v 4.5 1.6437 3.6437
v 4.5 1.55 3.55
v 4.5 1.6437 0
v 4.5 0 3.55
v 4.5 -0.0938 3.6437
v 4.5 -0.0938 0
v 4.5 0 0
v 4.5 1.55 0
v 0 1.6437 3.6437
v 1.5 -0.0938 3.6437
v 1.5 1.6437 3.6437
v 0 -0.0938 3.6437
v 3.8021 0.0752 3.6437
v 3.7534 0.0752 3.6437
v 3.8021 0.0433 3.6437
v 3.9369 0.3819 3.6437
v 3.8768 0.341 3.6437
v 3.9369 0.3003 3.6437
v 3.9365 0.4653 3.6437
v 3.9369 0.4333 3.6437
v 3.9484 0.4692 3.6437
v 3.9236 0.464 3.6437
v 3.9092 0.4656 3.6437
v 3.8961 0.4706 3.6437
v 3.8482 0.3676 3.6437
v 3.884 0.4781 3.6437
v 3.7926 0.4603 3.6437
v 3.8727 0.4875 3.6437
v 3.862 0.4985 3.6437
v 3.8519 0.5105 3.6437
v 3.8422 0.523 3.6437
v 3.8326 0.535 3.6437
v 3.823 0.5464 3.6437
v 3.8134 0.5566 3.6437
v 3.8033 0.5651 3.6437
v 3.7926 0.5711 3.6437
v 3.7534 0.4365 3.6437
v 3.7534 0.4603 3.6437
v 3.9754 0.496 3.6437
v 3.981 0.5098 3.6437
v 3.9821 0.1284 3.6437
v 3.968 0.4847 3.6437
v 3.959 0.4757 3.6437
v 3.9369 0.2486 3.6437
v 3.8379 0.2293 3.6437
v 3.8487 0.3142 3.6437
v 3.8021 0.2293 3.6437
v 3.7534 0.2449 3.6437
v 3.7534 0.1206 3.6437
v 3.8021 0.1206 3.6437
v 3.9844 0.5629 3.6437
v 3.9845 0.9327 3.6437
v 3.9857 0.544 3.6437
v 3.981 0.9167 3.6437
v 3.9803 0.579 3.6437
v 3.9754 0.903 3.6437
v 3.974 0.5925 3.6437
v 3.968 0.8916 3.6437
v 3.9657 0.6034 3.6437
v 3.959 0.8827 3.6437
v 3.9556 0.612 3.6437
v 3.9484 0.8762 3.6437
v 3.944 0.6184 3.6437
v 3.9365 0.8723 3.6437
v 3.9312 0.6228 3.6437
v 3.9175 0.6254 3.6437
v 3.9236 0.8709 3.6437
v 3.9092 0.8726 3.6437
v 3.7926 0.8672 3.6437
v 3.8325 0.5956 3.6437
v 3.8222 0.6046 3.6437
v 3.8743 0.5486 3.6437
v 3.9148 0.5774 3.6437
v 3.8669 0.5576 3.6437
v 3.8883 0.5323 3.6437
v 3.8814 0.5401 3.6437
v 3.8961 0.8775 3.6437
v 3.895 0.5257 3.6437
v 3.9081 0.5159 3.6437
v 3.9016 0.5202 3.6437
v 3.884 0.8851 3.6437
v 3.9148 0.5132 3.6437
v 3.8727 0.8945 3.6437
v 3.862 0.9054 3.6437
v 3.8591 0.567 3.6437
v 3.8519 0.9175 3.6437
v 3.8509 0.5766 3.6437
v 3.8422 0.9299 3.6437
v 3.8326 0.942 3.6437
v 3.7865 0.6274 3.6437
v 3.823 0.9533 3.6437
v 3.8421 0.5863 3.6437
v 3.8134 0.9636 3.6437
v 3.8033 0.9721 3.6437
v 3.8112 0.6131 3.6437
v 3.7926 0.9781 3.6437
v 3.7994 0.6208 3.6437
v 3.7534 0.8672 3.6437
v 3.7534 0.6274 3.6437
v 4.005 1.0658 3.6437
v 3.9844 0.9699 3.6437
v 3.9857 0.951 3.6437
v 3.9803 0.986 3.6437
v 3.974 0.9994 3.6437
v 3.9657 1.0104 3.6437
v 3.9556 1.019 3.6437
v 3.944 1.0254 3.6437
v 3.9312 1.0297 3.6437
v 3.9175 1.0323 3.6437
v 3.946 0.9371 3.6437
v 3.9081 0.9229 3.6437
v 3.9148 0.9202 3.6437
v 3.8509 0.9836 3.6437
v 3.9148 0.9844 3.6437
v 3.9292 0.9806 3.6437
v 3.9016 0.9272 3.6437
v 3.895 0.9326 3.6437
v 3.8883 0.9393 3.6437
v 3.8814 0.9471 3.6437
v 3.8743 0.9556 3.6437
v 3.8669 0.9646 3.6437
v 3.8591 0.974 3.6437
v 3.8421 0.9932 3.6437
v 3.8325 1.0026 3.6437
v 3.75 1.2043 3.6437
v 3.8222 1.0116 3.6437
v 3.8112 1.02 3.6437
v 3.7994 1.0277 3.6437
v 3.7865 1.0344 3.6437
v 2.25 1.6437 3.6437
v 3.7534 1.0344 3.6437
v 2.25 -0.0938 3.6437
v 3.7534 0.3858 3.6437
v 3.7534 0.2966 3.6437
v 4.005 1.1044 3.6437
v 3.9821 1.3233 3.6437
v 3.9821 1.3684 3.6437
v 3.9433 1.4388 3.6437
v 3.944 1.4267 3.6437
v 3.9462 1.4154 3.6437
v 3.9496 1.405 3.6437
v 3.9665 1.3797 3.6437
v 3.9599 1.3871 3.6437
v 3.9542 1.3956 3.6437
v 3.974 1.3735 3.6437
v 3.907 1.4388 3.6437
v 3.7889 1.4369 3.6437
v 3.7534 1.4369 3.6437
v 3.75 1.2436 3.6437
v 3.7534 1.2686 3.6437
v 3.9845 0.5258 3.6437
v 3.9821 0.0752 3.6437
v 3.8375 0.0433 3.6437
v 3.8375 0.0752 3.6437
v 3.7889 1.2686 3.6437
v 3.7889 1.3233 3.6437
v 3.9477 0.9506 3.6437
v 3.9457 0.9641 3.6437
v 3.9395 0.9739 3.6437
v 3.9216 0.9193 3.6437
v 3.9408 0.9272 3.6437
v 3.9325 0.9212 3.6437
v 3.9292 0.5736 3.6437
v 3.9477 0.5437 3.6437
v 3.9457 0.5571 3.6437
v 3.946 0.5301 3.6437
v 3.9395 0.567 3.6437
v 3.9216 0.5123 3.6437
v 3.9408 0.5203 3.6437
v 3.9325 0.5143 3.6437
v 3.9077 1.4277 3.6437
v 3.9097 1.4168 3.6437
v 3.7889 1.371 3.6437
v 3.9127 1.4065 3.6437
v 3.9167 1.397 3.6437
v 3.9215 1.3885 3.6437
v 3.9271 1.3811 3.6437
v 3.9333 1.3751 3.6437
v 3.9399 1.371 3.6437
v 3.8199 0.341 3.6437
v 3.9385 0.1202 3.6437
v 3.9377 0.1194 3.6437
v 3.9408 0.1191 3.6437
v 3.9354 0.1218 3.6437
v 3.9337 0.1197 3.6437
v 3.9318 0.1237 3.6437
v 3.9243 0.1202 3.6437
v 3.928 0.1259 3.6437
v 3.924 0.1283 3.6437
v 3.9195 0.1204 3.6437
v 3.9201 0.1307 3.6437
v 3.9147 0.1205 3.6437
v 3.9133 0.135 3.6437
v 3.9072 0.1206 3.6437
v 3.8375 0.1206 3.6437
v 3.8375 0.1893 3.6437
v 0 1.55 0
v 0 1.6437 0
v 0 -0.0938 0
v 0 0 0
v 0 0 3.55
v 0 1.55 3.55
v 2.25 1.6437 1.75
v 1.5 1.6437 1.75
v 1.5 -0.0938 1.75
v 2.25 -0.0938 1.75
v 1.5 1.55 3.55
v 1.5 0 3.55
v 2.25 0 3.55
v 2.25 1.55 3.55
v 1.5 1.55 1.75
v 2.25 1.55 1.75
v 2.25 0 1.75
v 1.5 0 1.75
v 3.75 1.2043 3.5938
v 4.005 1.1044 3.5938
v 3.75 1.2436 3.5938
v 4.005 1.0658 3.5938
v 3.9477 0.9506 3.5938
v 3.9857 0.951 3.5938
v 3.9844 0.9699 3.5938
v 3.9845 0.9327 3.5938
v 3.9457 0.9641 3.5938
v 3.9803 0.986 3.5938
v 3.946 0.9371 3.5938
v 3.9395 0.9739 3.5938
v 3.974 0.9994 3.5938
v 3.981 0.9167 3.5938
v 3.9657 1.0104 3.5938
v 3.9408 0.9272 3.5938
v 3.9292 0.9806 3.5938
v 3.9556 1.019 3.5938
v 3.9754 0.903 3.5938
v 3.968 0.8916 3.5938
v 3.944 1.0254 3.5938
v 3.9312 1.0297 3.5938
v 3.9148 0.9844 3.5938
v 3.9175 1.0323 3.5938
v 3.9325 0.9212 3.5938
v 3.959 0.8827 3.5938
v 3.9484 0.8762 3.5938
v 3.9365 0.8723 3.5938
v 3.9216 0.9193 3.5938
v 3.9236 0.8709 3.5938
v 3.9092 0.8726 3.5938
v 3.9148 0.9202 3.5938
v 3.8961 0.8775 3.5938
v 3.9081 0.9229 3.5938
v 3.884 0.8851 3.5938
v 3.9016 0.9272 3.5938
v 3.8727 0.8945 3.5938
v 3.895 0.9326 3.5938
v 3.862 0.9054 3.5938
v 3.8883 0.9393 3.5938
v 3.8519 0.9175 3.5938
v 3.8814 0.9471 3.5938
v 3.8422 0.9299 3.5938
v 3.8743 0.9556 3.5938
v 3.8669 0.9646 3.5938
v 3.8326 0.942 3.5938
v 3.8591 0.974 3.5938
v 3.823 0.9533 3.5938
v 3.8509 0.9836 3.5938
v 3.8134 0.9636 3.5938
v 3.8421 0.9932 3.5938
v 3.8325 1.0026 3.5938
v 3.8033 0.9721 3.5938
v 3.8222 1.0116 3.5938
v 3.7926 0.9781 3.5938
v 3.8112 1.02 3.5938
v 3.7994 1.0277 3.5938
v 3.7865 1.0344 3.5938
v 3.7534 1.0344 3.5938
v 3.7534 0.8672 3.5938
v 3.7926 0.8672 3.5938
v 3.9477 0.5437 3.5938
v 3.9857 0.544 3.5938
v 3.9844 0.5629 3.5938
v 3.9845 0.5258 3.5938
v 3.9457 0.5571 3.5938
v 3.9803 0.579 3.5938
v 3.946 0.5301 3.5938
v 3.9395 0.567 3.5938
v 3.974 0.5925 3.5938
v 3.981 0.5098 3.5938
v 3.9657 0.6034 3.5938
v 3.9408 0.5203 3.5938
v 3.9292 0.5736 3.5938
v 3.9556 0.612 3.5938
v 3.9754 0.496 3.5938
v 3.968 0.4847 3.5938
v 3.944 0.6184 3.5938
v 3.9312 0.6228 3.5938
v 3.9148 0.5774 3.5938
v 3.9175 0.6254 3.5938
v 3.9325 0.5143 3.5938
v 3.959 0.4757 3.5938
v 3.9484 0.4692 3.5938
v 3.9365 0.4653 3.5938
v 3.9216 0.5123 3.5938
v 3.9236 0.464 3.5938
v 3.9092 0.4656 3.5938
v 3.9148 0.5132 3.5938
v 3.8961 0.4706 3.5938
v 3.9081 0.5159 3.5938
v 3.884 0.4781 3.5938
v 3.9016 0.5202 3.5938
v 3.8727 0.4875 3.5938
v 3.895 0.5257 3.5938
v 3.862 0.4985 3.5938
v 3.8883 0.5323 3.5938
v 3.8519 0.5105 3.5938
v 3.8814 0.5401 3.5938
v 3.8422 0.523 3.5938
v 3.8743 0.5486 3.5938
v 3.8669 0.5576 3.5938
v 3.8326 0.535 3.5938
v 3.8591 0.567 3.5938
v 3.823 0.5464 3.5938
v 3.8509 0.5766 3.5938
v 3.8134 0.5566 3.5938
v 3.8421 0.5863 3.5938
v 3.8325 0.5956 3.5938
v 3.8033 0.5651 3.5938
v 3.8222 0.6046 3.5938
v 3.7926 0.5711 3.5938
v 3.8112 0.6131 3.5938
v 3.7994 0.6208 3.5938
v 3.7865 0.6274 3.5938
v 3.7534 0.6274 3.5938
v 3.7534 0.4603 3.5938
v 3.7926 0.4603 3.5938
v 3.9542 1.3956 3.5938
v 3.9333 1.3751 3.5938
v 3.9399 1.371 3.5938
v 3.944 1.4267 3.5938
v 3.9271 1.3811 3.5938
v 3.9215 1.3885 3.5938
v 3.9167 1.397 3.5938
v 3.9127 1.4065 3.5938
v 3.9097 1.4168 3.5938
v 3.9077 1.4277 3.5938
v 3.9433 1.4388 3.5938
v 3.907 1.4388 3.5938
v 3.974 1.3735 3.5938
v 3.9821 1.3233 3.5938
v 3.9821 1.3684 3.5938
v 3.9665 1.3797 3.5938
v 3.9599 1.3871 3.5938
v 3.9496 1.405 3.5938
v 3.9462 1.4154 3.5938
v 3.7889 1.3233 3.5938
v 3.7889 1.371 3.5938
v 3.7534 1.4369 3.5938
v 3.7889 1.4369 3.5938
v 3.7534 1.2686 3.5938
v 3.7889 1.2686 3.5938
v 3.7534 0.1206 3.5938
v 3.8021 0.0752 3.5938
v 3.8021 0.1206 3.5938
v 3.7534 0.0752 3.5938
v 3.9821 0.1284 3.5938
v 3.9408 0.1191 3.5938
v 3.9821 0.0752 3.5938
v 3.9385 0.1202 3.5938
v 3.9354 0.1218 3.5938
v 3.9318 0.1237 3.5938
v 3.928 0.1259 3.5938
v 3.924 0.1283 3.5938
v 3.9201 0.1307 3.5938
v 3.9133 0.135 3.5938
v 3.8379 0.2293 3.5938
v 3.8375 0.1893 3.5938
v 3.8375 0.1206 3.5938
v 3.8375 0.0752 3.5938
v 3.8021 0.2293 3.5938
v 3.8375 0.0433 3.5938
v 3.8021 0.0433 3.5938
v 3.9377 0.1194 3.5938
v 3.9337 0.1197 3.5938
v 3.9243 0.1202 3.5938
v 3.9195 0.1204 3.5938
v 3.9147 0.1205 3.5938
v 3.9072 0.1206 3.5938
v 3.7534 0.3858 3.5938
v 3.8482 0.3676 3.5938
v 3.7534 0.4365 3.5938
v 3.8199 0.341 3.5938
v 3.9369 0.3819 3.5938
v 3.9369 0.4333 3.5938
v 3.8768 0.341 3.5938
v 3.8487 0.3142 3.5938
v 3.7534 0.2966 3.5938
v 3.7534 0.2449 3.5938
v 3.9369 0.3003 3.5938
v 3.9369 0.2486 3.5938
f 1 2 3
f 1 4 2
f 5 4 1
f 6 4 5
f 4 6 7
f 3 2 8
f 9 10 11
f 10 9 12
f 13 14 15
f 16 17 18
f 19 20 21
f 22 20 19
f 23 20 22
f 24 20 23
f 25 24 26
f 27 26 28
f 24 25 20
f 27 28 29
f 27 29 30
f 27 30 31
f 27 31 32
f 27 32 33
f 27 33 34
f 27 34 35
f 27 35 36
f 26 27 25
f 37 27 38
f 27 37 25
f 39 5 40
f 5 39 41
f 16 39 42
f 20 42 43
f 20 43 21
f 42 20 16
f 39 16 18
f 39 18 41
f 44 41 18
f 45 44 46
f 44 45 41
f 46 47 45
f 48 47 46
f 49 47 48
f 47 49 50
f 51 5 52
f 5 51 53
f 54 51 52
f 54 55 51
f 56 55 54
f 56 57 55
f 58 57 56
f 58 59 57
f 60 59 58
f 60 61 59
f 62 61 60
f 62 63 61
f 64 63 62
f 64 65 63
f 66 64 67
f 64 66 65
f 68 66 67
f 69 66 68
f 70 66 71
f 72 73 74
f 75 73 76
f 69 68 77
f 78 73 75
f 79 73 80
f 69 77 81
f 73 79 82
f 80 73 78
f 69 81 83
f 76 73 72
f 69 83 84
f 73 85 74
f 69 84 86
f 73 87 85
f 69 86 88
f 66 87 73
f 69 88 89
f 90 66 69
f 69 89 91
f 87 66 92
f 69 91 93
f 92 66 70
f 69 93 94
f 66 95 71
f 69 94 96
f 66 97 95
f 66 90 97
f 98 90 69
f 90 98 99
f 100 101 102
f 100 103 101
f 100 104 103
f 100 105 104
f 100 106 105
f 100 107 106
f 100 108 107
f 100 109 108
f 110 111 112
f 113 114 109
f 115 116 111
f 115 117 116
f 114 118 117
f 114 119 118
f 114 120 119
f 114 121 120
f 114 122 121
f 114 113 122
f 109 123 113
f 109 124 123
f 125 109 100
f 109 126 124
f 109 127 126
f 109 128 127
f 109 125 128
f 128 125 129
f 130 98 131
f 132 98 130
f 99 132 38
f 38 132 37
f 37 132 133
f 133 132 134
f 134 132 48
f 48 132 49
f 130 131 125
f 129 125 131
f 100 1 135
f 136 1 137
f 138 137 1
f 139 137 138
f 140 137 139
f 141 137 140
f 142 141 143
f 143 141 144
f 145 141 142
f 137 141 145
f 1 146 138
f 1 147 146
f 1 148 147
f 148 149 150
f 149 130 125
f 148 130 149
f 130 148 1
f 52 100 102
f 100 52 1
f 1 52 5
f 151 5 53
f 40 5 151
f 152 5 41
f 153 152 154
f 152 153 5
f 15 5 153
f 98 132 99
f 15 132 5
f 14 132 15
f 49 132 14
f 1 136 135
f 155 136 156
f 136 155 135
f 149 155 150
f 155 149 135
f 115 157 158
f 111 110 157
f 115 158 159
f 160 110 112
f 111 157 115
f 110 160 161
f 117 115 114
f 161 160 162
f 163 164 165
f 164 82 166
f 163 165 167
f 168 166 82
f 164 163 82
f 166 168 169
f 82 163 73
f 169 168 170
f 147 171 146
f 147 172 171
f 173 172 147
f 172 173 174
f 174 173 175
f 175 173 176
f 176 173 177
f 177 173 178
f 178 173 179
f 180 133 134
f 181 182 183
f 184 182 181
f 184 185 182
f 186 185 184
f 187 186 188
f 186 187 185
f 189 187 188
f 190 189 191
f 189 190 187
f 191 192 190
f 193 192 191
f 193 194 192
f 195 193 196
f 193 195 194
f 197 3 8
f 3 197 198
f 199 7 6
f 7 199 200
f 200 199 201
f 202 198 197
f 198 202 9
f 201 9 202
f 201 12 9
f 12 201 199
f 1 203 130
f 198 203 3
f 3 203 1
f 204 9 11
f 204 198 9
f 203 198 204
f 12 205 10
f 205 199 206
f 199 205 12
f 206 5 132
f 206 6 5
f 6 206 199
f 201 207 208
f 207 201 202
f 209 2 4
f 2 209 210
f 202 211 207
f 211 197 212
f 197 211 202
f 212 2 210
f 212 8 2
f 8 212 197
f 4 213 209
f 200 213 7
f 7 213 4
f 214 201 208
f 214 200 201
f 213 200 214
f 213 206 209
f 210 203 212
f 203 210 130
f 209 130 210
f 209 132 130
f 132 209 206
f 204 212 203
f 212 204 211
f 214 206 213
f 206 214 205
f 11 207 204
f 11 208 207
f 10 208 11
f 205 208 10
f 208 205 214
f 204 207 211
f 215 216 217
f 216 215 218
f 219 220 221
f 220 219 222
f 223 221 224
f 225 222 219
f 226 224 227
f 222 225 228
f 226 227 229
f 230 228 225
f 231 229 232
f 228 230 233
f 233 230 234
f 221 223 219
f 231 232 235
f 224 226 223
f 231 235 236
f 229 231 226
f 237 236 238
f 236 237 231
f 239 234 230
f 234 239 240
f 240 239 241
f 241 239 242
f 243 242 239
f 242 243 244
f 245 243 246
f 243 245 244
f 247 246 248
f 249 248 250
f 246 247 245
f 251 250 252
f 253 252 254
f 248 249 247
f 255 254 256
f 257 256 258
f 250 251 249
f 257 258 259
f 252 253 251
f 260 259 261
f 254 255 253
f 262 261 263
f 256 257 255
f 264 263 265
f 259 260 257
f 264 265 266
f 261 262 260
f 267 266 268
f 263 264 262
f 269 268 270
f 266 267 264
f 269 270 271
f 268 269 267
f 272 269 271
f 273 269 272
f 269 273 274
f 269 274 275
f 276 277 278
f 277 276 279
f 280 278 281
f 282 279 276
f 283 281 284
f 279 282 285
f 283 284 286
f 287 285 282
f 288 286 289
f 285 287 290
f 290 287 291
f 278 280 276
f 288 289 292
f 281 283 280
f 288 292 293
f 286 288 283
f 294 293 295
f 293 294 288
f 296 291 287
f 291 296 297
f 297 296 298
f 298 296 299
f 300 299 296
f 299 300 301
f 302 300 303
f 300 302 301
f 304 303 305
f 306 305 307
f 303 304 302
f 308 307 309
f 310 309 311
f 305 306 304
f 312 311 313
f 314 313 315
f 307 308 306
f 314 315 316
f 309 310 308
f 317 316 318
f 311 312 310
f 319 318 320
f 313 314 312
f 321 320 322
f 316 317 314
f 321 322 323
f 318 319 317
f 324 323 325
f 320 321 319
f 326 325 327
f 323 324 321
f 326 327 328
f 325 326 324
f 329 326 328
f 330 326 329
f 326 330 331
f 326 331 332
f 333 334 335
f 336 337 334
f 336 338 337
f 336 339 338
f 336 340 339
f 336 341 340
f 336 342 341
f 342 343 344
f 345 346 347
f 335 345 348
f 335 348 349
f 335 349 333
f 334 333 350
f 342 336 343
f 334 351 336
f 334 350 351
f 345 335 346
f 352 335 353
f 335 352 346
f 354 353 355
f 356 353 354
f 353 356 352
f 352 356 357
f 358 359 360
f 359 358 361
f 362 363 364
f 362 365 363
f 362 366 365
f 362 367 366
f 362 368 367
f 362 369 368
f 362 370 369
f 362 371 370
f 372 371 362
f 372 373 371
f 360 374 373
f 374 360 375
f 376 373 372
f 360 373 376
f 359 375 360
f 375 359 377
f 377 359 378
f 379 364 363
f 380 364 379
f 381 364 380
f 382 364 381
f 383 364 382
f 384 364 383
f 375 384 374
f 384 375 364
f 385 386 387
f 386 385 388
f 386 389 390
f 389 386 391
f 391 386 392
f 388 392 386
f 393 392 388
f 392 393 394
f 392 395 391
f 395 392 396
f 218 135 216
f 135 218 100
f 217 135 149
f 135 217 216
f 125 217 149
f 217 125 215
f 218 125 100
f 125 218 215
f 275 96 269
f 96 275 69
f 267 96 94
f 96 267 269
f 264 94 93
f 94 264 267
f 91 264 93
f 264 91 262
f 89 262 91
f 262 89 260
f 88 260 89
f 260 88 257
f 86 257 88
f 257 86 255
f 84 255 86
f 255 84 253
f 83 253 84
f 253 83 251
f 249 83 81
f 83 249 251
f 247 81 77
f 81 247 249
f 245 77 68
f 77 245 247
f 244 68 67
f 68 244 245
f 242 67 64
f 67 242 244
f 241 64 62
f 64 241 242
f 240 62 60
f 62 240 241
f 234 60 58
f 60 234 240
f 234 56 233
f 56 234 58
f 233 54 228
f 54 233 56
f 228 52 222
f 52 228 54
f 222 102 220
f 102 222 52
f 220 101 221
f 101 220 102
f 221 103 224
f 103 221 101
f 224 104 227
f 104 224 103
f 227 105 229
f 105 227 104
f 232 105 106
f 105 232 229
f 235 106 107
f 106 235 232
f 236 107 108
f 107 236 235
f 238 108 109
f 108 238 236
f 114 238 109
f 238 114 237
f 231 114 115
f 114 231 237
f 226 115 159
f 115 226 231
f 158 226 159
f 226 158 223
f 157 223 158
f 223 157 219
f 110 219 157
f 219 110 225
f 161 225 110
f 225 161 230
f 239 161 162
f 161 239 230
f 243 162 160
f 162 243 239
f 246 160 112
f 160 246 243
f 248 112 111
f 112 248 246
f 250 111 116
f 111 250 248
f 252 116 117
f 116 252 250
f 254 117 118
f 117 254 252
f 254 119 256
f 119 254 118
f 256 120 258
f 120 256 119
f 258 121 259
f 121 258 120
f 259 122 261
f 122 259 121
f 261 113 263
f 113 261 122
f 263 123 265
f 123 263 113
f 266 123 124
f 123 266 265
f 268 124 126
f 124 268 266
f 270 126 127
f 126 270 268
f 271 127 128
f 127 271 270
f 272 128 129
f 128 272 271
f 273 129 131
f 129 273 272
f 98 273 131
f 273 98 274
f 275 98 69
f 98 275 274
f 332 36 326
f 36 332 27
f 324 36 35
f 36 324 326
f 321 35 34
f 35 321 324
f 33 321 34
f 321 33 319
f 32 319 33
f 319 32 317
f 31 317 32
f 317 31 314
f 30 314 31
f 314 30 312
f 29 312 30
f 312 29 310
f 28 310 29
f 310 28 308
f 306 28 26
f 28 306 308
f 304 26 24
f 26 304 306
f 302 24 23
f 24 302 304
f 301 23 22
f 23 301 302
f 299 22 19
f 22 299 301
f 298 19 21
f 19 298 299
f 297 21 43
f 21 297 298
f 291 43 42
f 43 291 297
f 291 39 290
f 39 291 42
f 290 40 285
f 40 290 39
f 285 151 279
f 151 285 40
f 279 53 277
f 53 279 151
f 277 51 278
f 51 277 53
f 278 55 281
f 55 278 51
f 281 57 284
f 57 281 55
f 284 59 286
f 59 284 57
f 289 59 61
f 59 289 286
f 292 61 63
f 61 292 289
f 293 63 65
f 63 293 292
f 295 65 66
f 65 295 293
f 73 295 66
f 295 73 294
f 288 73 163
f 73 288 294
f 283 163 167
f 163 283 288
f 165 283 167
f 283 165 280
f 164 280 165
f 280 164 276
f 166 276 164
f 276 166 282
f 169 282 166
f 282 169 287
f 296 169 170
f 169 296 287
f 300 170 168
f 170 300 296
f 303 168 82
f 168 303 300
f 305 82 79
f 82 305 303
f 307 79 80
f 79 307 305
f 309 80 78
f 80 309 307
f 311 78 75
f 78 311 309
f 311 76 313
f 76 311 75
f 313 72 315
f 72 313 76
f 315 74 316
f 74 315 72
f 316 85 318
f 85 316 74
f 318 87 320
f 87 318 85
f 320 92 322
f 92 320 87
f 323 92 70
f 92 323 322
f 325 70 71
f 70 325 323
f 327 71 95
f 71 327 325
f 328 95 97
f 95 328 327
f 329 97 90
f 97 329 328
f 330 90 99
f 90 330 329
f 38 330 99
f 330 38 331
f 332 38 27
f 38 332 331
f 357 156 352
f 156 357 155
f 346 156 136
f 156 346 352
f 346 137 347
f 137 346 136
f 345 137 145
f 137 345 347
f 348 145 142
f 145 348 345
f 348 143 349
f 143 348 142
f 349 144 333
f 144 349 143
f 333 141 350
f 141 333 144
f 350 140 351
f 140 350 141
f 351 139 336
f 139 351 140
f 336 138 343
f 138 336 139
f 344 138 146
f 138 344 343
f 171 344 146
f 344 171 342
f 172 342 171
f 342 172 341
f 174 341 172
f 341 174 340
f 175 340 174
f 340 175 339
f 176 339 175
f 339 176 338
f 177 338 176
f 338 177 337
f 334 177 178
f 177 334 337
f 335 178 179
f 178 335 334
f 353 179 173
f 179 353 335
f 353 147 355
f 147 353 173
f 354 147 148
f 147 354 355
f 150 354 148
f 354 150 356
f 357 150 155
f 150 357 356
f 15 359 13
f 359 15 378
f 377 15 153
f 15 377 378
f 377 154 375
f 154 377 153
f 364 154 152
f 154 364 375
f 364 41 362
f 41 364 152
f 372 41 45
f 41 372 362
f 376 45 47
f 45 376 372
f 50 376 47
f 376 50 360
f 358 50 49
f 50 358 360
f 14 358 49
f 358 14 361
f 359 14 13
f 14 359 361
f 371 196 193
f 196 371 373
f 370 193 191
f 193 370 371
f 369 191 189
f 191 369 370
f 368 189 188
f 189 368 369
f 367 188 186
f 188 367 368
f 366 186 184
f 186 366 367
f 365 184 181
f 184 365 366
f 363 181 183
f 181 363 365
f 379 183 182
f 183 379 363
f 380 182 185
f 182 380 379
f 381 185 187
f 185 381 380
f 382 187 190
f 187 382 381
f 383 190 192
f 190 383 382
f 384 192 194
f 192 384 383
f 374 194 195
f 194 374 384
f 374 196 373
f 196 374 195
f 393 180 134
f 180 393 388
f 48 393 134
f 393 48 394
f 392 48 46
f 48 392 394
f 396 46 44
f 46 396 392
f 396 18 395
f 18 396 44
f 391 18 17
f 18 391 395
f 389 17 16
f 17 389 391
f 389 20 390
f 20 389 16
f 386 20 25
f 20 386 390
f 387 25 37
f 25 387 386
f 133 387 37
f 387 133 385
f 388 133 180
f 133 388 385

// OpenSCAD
// file: config.scad
// All dimensions in INCHES
convert_to_mm = false;

nominal_size = "2x4"; // name of the nominal size
board_wide_face = 3.5; // nominal 4"
board_narrow_face = 1.5; // nominal 2"

/*
This defines how much larger the inner dimensions of the template are than the
board, to account for slightly oversize boards or moisture swelling. Measuring
my current batch of 2x4s with calipers, I found that setting the calipers at
3.55" for the wide face, and 1.55" for the narrow face, let them slide over
all of the boards. So, we set the padding to 0.05".
*/
template_padding = 0.05;

// Thickness of the template walls
template_wall_thickness = 3/32;

// Length of the depth template
template_length = 4.0;

// Width of the cut in the depth gauge
saw_kerf = 0.2;

// Diameter of the router bit hole in the depth gauge
router_bit_dia = 1.4;

// Height of raised text
text_height = 1/16;
// file: modules/as_mm.scad
module as_mm(convert_to_mm = false) {
    if(convert_to_mm == false) {
        children();
    } else {
        scale([25.4,25.4,25.4]){ // inches to mm
            children();
        }
    }
}
// main file
use <modules/as_mm.scad>
include <config.scad>

as_mm(convert_to_mm) {
    template_depth = board_narrow_face * 3;
    difference() {
        // this cube represents the walls of the template. It will have no bottom
        translate([0,-1 * template_wall_thickness,0]){
            cube([
              template_depth,
              board_narrow_face + template_padding + (template_wall_thickness * 2),
              board_wide_face + template_padding + template_wall_thickness
            ]);
        }
        // this cube represents the inner face of the template, touching the lumber
        cube([template_depth, board_narrow_face + template_padding, board_wide_face + template_padding]);
        // cut-out for marking wide-face half-lap inner edge
        translate([board_narrow_face,-1 * template_wall_thickness, board_wide_face * 0.5]){
            cube([
              board_narrow_face/2,
              board_narrow_face + template_padding + (2 * template_wall_thickness),
              board_wide_face
            ]);
        }
        // nominal dimension text
        translate([
          board_narrow_face * 2.5,
          board_narrow_face / 2,
          board_wide_face + template_wall_thickness
        ]){
            rotate([0,0,-90]){
                #linear_extrude(2 * template_wall_thickness){
                    text(str("1/2 ", nominal_size), size=0.25, font="Liberation Mono:style=Bold", halign="center", valign="bottom");
                }
            }
        }
        // URL text doesn't fit
    }
}
